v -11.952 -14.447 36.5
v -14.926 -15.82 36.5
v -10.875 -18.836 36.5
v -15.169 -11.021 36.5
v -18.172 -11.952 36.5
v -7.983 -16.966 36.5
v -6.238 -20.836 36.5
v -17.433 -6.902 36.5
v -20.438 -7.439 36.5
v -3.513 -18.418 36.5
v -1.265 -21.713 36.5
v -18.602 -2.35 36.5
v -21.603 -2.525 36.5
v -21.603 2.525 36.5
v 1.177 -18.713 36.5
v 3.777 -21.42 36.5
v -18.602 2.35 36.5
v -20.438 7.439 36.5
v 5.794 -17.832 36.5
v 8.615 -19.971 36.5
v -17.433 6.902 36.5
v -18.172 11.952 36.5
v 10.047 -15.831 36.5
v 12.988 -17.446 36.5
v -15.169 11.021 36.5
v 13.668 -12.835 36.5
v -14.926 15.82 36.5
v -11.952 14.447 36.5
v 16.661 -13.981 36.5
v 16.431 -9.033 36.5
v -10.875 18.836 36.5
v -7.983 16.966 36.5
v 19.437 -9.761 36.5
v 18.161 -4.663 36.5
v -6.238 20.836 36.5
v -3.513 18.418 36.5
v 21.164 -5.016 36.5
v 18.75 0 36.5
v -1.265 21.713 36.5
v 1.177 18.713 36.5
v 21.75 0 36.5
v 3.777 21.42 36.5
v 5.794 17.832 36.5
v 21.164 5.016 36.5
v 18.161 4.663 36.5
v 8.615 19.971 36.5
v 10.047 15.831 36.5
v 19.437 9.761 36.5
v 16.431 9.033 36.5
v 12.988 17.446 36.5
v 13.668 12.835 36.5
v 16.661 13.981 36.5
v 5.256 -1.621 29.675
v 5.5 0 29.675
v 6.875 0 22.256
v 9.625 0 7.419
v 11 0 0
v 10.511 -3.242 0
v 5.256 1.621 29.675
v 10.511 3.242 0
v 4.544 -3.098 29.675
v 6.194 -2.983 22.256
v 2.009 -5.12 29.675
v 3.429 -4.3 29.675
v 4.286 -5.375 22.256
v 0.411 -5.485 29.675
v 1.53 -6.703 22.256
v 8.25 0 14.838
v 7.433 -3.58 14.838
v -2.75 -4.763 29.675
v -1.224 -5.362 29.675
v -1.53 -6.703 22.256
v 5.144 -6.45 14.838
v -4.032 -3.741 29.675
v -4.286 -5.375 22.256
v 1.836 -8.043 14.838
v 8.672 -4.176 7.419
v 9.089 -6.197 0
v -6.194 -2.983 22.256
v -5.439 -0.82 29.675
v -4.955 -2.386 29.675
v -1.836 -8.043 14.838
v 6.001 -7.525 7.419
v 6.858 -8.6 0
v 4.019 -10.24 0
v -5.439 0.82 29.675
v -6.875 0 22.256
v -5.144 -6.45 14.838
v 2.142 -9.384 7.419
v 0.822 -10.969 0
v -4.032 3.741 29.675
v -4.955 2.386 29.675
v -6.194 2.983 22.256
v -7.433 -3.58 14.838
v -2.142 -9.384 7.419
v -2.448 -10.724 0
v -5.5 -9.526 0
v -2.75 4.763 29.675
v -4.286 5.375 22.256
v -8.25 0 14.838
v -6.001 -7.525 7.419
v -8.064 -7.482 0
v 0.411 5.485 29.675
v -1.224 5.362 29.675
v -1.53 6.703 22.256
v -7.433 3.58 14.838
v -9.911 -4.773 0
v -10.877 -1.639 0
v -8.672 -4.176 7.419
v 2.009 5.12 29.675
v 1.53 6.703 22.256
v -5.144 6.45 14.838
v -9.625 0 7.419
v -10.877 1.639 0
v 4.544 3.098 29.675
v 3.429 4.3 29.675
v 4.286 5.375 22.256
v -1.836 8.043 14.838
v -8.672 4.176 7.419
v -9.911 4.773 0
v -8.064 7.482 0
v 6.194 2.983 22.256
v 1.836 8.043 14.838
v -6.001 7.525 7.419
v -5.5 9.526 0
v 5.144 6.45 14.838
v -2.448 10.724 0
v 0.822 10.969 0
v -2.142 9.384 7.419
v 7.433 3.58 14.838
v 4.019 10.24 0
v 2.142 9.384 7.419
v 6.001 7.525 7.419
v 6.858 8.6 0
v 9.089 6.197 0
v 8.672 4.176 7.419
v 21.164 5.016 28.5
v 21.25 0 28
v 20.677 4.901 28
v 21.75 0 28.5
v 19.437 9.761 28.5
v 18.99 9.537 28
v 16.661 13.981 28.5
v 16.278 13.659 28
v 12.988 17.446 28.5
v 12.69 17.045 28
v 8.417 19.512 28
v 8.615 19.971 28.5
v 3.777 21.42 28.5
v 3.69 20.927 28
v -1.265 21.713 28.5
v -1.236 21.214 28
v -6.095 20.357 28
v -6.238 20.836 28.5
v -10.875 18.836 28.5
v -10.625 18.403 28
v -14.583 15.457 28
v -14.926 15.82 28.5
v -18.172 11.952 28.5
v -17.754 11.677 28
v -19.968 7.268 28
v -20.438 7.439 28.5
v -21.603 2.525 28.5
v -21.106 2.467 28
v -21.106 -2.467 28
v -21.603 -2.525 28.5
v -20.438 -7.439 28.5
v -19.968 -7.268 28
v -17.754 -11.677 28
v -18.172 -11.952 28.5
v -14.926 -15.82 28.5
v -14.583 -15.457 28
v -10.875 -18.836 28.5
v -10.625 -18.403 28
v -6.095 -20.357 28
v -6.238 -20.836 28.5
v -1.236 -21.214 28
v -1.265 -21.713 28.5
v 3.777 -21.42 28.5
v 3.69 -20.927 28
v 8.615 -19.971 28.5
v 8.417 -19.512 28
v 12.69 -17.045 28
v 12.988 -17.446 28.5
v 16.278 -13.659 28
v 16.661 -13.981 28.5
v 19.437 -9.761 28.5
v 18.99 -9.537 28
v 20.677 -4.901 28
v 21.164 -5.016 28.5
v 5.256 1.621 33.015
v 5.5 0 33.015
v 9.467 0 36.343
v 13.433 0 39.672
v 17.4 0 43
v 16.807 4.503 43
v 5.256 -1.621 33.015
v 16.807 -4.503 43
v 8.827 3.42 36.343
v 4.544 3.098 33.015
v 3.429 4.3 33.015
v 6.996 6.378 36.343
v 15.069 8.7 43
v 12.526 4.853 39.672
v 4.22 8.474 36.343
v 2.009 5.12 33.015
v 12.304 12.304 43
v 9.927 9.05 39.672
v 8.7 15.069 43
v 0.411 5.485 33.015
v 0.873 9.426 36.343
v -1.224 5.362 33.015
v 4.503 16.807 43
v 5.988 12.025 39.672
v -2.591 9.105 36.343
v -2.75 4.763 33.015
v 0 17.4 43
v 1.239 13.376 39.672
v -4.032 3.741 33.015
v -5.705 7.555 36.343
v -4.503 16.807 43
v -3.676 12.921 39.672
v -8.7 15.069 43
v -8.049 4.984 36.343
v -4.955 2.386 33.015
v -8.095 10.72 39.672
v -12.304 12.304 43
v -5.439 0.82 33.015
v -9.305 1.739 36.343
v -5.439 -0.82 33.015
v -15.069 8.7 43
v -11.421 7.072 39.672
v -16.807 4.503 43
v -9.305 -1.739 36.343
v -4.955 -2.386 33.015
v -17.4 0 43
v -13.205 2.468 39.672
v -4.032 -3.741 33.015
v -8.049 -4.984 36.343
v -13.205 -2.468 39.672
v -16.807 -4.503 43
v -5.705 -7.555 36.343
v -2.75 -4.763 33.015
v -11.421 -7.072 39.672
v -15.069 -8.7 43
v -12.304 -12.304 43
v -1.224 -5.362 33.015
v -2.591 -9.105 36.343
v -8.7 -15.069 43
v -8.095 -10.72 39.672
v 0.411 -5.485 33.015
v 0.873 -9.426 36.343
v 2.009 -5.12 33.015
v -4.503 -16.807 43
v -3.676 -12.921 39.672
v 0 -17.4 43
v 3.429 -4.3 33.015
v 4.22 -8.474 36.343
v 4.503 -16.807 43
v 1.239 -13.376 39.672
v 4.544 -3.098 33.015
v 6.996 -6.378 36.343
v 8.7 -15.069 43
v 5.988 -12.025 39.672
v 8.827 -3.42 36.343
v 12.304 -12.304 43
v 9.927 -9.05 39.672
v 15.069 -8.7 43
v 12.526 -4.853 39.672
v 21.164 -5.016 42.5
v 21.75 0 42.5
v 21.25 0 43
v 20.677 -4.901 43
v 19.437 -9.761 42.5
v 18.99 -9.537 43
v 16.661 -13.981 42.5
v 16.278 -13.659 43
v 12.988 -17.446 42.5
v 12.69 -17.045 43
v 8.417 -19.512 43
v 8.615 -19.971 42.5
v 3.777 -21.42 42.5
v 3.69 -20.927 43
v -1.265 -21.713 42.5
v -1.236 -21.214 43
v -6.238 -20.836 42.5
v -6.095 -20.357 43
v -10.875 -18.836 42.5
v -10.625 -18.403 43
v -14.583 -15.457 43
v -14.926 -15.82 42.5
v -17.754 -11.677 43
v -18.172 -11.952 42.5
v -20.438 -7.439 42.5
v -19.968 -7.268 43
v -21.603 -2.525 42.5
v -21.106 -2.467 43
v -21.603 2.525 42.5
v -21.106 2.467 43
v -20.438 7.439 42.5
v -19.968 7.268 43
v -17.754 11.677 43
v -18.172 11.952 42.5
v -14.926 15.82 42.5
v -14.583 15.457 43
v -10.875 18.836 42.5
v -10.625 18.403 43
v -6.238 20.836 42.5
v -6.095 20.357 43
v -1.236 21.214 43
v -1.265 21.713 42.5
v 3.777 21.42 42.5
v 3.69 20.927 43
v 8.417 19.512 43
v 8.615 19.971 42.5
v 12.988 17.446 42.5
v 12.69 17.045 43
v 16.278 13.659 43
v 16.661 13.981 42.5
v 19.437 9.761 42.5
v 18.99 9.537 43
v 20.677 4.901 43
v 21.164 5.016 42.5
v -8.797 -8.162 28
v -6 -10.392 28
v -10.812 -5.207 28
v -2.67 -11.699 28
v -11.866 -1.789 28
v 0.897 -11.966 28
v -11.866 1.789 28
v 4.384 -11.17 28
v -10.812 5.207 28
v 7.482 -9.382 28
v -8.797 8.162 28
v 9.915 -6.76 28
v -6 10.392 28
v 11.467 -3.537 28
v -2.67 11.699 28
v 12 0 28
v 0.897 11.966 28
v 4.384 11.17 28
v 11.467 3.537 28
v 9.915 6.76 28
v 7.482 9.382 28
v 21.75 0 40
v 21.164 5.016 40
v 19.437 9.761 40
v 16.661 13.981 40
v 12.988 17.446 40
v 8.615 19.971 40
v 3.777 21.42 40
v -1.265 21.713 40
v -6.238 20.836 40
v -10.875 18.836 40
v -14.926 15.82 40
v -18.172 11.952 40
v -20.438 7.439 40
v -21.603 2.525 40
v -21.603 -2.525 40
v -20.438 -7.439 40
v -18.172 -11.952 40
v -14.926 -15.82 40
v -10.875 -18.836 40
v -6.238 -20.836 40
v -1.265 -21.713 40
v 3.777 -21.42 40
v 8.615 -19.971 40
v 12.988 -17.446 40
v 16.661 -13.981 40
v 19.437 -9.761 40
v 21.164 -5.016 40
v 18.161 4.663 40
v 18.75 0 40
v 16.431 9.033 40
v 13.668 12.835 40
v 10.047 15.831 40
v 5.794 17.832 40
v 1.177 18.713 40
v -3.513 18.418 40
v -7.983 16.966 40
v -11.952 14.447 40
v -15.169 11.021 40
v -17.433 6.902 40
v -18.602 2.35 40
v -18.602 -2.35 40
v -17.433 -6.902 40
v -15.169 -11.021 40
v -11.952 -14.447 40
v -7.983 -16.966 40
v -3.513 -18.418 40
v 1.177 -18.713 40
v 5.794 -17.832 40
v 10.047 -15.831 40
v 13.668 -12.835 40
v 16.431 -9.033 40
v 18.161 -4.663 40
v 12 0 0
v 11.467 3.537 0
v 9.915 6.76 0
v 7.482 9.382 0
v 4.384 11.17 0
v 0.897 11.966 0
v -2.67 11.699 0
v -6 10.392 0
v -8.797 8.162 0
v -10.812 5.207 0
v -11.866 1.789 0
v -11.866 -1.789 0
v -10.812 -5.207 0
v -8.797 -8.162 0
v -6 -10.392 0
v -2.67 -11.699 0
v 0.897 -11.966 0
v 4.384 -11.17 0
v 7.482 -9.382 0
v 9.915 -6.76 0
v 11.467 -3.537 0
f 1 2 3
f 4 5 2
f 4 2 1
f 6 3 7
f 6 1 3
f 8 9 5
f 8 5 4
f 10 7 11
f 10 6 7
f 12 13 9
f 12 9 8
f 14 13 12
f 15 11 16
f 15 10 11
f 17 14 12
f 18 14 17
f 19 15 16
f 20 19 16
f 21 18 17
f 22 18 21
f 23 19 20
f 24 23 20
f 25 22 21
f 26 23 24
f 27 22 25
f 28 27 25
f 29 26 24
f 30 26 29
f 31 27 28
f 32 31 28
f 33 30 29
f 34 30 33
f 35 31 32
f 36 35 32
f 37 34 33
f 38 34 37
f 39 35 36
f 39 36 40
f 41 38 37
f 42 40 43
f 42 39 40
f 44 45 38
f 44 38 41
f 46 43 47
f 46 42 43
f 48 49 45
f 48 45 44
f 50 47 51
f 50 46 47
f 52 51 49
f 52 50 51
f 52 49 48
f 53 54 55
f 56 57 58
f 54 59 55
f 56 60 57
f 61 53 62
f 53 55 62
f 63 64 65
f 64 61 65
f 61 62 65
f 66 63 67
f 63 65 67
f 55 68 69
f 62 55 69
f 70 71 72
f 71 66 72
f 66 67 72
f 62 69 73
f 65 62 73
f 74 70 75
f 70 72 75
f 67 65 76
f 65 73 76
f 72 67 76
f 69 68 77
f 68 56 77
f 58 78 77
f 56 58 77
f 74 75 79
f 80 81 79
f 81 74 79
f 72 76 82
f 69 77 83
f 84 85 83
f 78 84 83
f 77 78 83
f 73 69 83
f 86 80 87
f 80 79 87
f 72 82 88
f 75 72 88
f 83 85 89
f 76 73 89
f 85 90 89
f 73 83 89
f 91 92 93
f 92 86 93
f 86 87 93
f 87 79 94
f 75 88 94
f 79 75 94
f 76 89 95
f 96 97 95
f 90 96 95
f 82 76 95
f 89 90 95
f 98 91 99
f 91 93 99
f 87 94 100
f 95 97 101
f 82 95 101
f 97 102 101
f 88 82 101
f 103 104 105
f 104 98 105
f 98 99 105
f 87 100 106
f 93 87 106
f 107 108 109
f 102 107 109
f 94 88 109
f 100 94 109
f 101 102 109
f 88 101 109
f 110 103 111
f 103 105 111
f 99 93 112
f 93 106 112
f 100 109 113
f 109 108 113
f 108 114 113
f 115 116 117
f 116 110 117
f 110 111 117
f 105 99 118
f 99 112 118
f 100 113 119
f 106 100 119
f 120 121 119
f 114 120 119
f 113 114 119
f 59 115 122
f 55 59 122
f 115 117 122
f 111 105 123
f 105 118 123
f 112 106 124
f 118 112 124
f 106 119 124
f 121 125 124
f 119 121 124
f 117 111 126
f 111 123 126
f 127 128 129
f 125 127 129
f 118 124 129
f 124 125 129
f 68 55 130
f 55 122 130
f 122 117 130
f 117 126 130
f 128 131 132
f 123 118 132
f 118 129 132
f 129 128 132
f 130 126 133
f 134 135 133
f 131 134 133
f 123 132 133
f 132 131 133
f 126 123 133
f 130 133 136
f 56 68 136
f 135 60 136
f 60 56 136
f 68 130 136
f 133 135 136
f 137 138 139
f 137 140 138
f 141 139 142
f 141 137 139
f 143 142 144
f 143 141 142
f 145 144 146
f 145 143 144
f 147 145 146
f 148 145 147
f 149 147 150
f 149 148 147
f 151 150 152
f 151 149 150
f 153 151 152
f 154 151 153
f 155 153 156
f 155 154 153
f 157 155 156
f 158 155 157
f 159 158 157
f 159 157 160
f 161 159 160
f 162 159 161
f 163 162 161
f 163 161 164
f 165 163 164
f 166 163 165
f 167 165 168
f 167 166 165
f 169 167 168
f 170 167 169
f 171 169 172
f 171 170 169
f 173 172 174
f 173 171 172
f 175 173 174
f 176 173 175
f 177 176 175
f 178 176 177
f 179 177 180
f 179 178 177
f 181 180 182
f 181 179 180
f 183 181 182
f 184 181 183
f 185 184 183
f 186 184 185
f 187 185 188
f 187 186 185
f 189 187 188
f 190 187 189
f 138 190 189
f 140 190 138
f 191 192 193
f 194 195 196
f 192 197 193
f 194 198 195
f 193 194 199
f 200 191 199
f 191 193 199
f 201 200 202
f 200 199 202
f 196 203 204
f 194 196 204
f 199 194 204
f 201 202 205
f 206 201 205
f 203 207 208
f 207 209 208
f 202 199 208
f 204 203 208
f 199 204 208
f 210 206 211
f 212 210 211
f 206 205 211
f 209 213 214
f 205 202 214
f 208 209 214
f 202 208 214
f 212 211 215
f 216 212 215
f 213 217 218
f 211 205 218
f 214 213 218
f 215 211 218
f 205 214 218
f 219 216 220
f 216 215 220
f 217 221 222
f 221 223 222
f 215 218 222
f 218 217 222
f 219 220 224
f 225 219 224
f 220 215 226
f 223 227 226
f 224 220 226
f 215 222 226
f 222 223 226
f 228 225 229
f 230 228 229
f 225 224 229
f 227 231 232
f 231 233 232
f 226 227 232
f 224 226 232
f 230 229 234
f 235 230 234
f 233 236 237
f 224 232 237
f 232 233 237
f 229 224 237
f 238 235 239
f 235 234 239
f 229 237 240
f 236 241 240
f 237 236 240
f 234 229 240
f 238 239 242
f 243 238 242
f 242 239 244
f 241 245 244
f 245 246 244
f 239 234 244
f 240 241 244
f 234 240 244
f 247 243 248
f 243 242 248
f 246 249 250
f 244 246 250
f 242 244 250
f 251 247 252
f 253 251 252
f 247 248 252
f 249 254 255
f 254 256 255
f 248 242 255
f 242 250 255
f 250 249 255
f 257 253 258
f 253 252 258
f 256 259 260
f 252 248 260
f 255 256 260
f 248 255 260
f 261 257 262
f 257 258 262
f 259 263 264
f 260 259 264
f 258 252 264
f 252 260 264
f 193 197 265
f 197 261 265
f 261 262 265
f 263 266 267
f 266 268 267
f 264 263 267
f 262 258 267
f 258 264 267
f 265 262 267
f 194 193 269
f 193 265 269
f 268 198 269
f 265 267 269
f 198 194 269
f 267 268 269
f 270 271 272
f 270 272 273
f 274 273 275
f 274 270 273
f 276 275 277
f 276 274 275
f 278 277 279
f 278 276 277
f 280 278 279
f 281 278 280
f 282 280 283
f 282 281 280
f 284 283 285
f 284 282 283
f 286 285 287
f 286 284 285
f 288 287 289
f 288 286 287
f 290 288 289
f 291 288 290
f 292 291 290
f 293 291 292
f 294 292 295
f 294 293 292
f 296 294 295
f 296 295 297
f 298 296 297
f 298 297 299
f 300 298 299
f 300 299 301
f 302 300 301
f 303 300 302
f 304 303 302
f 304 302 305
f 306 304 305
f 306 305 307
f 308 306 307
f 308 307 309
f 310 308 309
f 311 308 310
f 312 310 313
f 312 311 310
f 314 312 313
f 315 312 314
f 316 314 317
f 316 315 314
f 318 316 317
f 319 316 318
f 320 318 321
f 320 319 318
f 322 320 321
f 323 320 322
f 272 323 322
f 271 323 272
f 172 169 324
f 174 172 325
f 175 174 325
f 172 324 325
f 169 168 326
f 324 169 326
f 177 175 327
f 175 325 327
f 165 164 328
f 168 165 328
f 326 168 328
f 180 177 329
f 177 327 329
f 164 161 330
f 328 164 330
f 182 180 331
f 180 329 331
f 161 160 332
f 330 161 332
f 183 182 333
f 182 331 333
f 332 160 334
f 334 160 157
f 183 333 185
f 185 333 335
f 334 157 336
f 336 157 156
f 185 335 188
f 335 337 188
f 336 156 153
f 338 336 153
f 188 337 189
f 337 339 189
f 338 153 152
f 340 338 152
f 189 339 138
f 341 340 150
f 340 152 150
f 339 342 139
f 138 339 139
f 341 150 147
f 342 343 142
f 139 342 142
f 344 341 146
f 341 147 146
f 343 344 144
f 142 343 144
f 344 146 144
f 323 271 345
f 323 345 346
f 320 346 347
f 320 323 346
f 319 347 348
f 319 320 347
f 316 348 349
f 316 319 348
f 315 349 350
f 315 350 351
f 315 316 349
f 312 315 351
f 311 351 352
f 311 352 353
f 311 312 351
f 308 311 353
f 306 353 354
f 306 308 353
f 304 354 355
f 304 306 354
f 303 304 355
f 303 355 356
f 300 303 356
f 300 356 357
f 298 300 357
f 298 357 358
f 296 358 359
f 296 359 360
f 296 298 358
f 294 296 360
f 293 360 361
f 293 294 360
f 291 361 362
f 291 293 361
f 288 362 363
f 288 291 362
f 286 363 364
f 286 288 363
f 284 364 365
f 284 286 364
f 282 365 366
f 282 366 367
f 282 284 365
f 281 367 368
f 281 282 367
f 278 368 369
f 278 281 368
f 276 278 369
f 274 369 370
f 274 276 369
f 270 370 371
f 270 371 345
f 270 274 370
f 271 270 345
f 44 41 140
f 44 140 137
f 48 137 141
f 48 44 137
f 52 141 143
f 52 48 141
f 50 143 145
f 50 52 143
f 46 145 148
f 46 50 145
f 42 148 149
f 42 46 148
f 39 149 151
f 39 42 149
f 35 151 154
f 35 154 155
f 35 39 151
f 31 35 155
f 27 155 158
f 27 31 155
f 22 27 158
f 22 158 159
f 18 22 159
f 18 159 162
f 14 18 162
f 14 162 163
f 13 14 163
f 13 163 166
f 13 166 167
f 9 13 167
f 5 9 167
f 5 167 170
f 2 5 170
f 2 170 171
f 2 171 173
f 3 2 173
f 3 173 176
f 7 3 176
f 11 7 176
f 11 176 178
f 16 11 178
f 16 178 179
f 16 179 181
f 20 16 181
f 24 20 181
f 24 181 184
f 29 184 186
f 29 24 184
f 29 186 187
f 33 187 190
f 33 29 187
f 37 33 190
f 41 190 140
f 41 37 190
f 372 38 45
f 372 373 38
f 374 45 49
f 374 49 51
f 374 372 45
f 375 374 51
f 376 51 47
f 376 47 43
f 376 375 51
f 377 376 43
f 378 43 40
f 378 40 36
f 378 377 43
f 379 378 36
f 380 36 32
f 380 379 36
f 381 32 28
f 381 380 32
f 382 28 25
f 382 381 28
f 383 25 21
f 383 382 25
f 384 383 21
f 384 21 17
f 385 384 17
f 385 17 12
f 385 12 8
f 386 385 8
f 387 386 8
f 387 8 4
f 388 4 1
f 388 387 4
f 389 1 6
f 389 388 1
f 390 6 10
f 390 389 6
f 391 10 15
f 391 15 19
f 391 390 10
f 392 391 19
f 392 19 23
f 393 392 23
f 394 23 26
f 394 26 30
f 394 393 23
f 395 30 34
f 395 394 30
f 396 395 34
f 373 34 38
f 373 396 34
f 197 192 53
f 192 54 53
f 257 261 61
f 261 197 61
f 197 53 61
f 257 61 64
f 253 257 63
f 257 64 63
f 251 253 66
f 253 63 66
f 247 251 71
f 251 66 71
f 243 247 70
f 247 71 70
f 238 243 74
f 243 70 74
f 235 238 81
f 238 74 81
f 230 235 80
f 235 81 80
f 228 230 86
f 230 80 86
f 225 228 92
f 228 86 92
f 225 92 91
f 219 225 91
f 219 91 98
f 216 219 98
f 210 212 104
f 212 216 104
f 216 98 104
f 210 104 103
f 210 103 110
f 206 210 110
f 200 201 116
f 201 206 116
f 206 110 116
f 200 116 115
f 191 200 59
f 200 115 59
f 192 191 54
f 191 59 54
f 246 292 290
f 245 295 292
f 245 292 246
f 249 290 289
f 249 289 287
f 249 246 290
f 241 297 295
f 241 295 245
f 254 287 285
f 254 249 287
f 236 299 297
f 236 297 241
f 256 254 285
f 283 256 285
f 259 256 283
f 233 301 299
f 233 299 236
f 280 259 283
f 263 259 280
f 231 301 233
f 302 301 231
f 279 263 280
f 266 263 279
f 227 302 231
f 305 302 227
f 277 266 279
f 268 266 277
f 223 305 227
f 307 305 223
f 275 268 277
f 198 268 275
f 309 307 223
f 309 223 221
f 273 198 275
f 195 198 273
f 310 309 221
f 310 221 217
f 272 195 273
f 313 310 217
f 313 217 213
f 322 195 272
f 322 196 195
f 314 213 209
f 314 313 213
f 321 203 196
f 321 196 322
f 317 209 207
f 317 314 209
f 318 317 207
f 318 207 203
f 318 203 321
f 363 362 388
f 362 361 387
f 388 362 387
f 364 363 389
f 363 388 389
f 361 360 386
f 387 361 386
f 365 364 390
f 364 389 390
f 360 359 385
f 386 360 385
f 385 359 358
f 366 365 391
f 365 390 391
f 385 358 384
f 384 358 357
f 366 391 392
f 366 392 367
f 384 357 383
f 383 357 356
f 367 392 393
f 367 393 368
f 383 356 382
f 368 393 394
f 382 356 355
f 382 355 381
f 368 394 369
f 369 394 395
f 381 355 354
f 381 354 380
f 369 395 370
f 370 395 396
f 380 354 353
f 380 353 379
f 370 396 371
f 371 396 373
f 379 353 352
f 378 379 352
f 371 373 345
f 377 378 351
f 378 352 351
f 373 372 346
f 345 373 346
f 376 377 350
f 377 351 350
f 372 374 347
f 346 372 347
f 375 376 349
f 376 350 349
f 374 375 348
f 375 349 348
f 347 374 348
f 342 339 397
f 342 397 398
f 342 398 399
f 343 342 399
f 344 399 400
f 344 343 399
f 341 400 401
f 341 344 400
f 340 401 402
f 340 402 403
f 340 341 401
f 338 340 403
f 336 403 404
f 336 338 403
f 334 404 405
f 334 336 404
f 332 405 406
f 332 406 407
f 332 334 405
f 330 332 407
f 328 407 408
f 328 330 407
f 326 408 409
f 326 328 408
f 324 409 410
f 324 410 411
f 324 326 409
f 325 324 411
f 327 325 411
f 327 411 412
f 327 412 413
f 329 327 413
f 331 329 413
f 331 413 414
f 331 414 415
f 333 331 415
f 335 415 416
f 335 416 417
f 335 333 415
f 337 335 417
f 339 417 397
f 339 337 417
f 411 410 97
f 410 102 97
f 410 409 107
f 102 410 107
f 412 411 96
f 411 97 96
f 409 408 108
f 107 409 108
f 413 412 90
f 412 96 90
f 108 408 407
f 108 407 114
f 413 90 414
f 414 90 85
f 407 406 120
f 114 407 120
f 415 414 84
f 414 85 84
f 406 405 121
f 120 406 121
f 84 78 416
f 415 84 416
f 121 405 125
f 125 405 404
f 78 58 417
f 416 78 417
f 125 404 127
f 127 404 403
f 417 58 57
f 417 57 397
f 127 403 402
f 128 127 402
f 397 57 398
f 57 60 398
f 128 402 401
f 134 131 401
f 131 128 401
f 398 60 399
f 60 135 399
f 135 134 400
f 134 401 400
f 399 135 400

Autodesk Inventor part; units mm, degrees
ref_plane "YZ Plane" through (0, 0, 0) normal (1, 0, 0) x (0, 1, 0)
ref_plane "XZ Plane" through (0, 0, 0) normal (0, 1, 0) x (-1, 0, 0)
ref_plane "XY Plane" through (0, 0, 0) normal (0, 0, 1) x (1, 0, 0)
sketch "Sketch3" plane through (0, 0, 0) normal (0, 1, 0) x (-1, 0, 0)
  line L0 (0, 0) -> (0, 43)
  line L1 (-11, 0) -> (-12, 0)
  line L2 (-12, 0) -> (-12, 28)
  line L3 (-12, 28) -> (-21.75, 28)
  line L4 (-21.75, 28) -> (-21.75, 36.5)
  line L5 (-21.75, 36.5) -> (-18.75, 36.5)
  line L6 (-18.75, 36.5) -> (-18.75, 40)
  line L7 (-18.75, 40) -> (-21.75, 40)
  line L8 (-21.75, 40) -> (-21.75, 43)
  line L9 (-21.75, 43) -> (-17.4, 43)
  line L10 (-17.4, 43) -> (-5.5, 33.0147)
  line L11 (-5.5, 33.0147) -> (-5.5, 29.6753)
  line L12 (-5.5, 29.6753) -> (-11, 0)
  dimension "d1" = 24
  dimension "d2" = 28
  dimension "d3" = 43
  dimension "d5" = 3.5
  dimension "d6" = 43.5
  dimension "d7" = 37.5
  dimension "d8" = 34.8
  dimension "d9" = 11
  dimension "d10" = 29.6753
  dimension "d11" = 9.9853
  dimension "d12" = 22
  dimension "d14" = 10.5
  dimension "d15" = 50
  dimension "d17" = 36.5
revolve "Revolution1" add sketch "Sketch3" angle 360 about axis through (0, 0, 0) along (0, 0, 1)
chamfer "Chamfer1" distance 0.5 angle 45 2 edges at (-21.75, 0, 43) (-21.75, 0, 28)
properties part number "Nozzle" material "Steel"
